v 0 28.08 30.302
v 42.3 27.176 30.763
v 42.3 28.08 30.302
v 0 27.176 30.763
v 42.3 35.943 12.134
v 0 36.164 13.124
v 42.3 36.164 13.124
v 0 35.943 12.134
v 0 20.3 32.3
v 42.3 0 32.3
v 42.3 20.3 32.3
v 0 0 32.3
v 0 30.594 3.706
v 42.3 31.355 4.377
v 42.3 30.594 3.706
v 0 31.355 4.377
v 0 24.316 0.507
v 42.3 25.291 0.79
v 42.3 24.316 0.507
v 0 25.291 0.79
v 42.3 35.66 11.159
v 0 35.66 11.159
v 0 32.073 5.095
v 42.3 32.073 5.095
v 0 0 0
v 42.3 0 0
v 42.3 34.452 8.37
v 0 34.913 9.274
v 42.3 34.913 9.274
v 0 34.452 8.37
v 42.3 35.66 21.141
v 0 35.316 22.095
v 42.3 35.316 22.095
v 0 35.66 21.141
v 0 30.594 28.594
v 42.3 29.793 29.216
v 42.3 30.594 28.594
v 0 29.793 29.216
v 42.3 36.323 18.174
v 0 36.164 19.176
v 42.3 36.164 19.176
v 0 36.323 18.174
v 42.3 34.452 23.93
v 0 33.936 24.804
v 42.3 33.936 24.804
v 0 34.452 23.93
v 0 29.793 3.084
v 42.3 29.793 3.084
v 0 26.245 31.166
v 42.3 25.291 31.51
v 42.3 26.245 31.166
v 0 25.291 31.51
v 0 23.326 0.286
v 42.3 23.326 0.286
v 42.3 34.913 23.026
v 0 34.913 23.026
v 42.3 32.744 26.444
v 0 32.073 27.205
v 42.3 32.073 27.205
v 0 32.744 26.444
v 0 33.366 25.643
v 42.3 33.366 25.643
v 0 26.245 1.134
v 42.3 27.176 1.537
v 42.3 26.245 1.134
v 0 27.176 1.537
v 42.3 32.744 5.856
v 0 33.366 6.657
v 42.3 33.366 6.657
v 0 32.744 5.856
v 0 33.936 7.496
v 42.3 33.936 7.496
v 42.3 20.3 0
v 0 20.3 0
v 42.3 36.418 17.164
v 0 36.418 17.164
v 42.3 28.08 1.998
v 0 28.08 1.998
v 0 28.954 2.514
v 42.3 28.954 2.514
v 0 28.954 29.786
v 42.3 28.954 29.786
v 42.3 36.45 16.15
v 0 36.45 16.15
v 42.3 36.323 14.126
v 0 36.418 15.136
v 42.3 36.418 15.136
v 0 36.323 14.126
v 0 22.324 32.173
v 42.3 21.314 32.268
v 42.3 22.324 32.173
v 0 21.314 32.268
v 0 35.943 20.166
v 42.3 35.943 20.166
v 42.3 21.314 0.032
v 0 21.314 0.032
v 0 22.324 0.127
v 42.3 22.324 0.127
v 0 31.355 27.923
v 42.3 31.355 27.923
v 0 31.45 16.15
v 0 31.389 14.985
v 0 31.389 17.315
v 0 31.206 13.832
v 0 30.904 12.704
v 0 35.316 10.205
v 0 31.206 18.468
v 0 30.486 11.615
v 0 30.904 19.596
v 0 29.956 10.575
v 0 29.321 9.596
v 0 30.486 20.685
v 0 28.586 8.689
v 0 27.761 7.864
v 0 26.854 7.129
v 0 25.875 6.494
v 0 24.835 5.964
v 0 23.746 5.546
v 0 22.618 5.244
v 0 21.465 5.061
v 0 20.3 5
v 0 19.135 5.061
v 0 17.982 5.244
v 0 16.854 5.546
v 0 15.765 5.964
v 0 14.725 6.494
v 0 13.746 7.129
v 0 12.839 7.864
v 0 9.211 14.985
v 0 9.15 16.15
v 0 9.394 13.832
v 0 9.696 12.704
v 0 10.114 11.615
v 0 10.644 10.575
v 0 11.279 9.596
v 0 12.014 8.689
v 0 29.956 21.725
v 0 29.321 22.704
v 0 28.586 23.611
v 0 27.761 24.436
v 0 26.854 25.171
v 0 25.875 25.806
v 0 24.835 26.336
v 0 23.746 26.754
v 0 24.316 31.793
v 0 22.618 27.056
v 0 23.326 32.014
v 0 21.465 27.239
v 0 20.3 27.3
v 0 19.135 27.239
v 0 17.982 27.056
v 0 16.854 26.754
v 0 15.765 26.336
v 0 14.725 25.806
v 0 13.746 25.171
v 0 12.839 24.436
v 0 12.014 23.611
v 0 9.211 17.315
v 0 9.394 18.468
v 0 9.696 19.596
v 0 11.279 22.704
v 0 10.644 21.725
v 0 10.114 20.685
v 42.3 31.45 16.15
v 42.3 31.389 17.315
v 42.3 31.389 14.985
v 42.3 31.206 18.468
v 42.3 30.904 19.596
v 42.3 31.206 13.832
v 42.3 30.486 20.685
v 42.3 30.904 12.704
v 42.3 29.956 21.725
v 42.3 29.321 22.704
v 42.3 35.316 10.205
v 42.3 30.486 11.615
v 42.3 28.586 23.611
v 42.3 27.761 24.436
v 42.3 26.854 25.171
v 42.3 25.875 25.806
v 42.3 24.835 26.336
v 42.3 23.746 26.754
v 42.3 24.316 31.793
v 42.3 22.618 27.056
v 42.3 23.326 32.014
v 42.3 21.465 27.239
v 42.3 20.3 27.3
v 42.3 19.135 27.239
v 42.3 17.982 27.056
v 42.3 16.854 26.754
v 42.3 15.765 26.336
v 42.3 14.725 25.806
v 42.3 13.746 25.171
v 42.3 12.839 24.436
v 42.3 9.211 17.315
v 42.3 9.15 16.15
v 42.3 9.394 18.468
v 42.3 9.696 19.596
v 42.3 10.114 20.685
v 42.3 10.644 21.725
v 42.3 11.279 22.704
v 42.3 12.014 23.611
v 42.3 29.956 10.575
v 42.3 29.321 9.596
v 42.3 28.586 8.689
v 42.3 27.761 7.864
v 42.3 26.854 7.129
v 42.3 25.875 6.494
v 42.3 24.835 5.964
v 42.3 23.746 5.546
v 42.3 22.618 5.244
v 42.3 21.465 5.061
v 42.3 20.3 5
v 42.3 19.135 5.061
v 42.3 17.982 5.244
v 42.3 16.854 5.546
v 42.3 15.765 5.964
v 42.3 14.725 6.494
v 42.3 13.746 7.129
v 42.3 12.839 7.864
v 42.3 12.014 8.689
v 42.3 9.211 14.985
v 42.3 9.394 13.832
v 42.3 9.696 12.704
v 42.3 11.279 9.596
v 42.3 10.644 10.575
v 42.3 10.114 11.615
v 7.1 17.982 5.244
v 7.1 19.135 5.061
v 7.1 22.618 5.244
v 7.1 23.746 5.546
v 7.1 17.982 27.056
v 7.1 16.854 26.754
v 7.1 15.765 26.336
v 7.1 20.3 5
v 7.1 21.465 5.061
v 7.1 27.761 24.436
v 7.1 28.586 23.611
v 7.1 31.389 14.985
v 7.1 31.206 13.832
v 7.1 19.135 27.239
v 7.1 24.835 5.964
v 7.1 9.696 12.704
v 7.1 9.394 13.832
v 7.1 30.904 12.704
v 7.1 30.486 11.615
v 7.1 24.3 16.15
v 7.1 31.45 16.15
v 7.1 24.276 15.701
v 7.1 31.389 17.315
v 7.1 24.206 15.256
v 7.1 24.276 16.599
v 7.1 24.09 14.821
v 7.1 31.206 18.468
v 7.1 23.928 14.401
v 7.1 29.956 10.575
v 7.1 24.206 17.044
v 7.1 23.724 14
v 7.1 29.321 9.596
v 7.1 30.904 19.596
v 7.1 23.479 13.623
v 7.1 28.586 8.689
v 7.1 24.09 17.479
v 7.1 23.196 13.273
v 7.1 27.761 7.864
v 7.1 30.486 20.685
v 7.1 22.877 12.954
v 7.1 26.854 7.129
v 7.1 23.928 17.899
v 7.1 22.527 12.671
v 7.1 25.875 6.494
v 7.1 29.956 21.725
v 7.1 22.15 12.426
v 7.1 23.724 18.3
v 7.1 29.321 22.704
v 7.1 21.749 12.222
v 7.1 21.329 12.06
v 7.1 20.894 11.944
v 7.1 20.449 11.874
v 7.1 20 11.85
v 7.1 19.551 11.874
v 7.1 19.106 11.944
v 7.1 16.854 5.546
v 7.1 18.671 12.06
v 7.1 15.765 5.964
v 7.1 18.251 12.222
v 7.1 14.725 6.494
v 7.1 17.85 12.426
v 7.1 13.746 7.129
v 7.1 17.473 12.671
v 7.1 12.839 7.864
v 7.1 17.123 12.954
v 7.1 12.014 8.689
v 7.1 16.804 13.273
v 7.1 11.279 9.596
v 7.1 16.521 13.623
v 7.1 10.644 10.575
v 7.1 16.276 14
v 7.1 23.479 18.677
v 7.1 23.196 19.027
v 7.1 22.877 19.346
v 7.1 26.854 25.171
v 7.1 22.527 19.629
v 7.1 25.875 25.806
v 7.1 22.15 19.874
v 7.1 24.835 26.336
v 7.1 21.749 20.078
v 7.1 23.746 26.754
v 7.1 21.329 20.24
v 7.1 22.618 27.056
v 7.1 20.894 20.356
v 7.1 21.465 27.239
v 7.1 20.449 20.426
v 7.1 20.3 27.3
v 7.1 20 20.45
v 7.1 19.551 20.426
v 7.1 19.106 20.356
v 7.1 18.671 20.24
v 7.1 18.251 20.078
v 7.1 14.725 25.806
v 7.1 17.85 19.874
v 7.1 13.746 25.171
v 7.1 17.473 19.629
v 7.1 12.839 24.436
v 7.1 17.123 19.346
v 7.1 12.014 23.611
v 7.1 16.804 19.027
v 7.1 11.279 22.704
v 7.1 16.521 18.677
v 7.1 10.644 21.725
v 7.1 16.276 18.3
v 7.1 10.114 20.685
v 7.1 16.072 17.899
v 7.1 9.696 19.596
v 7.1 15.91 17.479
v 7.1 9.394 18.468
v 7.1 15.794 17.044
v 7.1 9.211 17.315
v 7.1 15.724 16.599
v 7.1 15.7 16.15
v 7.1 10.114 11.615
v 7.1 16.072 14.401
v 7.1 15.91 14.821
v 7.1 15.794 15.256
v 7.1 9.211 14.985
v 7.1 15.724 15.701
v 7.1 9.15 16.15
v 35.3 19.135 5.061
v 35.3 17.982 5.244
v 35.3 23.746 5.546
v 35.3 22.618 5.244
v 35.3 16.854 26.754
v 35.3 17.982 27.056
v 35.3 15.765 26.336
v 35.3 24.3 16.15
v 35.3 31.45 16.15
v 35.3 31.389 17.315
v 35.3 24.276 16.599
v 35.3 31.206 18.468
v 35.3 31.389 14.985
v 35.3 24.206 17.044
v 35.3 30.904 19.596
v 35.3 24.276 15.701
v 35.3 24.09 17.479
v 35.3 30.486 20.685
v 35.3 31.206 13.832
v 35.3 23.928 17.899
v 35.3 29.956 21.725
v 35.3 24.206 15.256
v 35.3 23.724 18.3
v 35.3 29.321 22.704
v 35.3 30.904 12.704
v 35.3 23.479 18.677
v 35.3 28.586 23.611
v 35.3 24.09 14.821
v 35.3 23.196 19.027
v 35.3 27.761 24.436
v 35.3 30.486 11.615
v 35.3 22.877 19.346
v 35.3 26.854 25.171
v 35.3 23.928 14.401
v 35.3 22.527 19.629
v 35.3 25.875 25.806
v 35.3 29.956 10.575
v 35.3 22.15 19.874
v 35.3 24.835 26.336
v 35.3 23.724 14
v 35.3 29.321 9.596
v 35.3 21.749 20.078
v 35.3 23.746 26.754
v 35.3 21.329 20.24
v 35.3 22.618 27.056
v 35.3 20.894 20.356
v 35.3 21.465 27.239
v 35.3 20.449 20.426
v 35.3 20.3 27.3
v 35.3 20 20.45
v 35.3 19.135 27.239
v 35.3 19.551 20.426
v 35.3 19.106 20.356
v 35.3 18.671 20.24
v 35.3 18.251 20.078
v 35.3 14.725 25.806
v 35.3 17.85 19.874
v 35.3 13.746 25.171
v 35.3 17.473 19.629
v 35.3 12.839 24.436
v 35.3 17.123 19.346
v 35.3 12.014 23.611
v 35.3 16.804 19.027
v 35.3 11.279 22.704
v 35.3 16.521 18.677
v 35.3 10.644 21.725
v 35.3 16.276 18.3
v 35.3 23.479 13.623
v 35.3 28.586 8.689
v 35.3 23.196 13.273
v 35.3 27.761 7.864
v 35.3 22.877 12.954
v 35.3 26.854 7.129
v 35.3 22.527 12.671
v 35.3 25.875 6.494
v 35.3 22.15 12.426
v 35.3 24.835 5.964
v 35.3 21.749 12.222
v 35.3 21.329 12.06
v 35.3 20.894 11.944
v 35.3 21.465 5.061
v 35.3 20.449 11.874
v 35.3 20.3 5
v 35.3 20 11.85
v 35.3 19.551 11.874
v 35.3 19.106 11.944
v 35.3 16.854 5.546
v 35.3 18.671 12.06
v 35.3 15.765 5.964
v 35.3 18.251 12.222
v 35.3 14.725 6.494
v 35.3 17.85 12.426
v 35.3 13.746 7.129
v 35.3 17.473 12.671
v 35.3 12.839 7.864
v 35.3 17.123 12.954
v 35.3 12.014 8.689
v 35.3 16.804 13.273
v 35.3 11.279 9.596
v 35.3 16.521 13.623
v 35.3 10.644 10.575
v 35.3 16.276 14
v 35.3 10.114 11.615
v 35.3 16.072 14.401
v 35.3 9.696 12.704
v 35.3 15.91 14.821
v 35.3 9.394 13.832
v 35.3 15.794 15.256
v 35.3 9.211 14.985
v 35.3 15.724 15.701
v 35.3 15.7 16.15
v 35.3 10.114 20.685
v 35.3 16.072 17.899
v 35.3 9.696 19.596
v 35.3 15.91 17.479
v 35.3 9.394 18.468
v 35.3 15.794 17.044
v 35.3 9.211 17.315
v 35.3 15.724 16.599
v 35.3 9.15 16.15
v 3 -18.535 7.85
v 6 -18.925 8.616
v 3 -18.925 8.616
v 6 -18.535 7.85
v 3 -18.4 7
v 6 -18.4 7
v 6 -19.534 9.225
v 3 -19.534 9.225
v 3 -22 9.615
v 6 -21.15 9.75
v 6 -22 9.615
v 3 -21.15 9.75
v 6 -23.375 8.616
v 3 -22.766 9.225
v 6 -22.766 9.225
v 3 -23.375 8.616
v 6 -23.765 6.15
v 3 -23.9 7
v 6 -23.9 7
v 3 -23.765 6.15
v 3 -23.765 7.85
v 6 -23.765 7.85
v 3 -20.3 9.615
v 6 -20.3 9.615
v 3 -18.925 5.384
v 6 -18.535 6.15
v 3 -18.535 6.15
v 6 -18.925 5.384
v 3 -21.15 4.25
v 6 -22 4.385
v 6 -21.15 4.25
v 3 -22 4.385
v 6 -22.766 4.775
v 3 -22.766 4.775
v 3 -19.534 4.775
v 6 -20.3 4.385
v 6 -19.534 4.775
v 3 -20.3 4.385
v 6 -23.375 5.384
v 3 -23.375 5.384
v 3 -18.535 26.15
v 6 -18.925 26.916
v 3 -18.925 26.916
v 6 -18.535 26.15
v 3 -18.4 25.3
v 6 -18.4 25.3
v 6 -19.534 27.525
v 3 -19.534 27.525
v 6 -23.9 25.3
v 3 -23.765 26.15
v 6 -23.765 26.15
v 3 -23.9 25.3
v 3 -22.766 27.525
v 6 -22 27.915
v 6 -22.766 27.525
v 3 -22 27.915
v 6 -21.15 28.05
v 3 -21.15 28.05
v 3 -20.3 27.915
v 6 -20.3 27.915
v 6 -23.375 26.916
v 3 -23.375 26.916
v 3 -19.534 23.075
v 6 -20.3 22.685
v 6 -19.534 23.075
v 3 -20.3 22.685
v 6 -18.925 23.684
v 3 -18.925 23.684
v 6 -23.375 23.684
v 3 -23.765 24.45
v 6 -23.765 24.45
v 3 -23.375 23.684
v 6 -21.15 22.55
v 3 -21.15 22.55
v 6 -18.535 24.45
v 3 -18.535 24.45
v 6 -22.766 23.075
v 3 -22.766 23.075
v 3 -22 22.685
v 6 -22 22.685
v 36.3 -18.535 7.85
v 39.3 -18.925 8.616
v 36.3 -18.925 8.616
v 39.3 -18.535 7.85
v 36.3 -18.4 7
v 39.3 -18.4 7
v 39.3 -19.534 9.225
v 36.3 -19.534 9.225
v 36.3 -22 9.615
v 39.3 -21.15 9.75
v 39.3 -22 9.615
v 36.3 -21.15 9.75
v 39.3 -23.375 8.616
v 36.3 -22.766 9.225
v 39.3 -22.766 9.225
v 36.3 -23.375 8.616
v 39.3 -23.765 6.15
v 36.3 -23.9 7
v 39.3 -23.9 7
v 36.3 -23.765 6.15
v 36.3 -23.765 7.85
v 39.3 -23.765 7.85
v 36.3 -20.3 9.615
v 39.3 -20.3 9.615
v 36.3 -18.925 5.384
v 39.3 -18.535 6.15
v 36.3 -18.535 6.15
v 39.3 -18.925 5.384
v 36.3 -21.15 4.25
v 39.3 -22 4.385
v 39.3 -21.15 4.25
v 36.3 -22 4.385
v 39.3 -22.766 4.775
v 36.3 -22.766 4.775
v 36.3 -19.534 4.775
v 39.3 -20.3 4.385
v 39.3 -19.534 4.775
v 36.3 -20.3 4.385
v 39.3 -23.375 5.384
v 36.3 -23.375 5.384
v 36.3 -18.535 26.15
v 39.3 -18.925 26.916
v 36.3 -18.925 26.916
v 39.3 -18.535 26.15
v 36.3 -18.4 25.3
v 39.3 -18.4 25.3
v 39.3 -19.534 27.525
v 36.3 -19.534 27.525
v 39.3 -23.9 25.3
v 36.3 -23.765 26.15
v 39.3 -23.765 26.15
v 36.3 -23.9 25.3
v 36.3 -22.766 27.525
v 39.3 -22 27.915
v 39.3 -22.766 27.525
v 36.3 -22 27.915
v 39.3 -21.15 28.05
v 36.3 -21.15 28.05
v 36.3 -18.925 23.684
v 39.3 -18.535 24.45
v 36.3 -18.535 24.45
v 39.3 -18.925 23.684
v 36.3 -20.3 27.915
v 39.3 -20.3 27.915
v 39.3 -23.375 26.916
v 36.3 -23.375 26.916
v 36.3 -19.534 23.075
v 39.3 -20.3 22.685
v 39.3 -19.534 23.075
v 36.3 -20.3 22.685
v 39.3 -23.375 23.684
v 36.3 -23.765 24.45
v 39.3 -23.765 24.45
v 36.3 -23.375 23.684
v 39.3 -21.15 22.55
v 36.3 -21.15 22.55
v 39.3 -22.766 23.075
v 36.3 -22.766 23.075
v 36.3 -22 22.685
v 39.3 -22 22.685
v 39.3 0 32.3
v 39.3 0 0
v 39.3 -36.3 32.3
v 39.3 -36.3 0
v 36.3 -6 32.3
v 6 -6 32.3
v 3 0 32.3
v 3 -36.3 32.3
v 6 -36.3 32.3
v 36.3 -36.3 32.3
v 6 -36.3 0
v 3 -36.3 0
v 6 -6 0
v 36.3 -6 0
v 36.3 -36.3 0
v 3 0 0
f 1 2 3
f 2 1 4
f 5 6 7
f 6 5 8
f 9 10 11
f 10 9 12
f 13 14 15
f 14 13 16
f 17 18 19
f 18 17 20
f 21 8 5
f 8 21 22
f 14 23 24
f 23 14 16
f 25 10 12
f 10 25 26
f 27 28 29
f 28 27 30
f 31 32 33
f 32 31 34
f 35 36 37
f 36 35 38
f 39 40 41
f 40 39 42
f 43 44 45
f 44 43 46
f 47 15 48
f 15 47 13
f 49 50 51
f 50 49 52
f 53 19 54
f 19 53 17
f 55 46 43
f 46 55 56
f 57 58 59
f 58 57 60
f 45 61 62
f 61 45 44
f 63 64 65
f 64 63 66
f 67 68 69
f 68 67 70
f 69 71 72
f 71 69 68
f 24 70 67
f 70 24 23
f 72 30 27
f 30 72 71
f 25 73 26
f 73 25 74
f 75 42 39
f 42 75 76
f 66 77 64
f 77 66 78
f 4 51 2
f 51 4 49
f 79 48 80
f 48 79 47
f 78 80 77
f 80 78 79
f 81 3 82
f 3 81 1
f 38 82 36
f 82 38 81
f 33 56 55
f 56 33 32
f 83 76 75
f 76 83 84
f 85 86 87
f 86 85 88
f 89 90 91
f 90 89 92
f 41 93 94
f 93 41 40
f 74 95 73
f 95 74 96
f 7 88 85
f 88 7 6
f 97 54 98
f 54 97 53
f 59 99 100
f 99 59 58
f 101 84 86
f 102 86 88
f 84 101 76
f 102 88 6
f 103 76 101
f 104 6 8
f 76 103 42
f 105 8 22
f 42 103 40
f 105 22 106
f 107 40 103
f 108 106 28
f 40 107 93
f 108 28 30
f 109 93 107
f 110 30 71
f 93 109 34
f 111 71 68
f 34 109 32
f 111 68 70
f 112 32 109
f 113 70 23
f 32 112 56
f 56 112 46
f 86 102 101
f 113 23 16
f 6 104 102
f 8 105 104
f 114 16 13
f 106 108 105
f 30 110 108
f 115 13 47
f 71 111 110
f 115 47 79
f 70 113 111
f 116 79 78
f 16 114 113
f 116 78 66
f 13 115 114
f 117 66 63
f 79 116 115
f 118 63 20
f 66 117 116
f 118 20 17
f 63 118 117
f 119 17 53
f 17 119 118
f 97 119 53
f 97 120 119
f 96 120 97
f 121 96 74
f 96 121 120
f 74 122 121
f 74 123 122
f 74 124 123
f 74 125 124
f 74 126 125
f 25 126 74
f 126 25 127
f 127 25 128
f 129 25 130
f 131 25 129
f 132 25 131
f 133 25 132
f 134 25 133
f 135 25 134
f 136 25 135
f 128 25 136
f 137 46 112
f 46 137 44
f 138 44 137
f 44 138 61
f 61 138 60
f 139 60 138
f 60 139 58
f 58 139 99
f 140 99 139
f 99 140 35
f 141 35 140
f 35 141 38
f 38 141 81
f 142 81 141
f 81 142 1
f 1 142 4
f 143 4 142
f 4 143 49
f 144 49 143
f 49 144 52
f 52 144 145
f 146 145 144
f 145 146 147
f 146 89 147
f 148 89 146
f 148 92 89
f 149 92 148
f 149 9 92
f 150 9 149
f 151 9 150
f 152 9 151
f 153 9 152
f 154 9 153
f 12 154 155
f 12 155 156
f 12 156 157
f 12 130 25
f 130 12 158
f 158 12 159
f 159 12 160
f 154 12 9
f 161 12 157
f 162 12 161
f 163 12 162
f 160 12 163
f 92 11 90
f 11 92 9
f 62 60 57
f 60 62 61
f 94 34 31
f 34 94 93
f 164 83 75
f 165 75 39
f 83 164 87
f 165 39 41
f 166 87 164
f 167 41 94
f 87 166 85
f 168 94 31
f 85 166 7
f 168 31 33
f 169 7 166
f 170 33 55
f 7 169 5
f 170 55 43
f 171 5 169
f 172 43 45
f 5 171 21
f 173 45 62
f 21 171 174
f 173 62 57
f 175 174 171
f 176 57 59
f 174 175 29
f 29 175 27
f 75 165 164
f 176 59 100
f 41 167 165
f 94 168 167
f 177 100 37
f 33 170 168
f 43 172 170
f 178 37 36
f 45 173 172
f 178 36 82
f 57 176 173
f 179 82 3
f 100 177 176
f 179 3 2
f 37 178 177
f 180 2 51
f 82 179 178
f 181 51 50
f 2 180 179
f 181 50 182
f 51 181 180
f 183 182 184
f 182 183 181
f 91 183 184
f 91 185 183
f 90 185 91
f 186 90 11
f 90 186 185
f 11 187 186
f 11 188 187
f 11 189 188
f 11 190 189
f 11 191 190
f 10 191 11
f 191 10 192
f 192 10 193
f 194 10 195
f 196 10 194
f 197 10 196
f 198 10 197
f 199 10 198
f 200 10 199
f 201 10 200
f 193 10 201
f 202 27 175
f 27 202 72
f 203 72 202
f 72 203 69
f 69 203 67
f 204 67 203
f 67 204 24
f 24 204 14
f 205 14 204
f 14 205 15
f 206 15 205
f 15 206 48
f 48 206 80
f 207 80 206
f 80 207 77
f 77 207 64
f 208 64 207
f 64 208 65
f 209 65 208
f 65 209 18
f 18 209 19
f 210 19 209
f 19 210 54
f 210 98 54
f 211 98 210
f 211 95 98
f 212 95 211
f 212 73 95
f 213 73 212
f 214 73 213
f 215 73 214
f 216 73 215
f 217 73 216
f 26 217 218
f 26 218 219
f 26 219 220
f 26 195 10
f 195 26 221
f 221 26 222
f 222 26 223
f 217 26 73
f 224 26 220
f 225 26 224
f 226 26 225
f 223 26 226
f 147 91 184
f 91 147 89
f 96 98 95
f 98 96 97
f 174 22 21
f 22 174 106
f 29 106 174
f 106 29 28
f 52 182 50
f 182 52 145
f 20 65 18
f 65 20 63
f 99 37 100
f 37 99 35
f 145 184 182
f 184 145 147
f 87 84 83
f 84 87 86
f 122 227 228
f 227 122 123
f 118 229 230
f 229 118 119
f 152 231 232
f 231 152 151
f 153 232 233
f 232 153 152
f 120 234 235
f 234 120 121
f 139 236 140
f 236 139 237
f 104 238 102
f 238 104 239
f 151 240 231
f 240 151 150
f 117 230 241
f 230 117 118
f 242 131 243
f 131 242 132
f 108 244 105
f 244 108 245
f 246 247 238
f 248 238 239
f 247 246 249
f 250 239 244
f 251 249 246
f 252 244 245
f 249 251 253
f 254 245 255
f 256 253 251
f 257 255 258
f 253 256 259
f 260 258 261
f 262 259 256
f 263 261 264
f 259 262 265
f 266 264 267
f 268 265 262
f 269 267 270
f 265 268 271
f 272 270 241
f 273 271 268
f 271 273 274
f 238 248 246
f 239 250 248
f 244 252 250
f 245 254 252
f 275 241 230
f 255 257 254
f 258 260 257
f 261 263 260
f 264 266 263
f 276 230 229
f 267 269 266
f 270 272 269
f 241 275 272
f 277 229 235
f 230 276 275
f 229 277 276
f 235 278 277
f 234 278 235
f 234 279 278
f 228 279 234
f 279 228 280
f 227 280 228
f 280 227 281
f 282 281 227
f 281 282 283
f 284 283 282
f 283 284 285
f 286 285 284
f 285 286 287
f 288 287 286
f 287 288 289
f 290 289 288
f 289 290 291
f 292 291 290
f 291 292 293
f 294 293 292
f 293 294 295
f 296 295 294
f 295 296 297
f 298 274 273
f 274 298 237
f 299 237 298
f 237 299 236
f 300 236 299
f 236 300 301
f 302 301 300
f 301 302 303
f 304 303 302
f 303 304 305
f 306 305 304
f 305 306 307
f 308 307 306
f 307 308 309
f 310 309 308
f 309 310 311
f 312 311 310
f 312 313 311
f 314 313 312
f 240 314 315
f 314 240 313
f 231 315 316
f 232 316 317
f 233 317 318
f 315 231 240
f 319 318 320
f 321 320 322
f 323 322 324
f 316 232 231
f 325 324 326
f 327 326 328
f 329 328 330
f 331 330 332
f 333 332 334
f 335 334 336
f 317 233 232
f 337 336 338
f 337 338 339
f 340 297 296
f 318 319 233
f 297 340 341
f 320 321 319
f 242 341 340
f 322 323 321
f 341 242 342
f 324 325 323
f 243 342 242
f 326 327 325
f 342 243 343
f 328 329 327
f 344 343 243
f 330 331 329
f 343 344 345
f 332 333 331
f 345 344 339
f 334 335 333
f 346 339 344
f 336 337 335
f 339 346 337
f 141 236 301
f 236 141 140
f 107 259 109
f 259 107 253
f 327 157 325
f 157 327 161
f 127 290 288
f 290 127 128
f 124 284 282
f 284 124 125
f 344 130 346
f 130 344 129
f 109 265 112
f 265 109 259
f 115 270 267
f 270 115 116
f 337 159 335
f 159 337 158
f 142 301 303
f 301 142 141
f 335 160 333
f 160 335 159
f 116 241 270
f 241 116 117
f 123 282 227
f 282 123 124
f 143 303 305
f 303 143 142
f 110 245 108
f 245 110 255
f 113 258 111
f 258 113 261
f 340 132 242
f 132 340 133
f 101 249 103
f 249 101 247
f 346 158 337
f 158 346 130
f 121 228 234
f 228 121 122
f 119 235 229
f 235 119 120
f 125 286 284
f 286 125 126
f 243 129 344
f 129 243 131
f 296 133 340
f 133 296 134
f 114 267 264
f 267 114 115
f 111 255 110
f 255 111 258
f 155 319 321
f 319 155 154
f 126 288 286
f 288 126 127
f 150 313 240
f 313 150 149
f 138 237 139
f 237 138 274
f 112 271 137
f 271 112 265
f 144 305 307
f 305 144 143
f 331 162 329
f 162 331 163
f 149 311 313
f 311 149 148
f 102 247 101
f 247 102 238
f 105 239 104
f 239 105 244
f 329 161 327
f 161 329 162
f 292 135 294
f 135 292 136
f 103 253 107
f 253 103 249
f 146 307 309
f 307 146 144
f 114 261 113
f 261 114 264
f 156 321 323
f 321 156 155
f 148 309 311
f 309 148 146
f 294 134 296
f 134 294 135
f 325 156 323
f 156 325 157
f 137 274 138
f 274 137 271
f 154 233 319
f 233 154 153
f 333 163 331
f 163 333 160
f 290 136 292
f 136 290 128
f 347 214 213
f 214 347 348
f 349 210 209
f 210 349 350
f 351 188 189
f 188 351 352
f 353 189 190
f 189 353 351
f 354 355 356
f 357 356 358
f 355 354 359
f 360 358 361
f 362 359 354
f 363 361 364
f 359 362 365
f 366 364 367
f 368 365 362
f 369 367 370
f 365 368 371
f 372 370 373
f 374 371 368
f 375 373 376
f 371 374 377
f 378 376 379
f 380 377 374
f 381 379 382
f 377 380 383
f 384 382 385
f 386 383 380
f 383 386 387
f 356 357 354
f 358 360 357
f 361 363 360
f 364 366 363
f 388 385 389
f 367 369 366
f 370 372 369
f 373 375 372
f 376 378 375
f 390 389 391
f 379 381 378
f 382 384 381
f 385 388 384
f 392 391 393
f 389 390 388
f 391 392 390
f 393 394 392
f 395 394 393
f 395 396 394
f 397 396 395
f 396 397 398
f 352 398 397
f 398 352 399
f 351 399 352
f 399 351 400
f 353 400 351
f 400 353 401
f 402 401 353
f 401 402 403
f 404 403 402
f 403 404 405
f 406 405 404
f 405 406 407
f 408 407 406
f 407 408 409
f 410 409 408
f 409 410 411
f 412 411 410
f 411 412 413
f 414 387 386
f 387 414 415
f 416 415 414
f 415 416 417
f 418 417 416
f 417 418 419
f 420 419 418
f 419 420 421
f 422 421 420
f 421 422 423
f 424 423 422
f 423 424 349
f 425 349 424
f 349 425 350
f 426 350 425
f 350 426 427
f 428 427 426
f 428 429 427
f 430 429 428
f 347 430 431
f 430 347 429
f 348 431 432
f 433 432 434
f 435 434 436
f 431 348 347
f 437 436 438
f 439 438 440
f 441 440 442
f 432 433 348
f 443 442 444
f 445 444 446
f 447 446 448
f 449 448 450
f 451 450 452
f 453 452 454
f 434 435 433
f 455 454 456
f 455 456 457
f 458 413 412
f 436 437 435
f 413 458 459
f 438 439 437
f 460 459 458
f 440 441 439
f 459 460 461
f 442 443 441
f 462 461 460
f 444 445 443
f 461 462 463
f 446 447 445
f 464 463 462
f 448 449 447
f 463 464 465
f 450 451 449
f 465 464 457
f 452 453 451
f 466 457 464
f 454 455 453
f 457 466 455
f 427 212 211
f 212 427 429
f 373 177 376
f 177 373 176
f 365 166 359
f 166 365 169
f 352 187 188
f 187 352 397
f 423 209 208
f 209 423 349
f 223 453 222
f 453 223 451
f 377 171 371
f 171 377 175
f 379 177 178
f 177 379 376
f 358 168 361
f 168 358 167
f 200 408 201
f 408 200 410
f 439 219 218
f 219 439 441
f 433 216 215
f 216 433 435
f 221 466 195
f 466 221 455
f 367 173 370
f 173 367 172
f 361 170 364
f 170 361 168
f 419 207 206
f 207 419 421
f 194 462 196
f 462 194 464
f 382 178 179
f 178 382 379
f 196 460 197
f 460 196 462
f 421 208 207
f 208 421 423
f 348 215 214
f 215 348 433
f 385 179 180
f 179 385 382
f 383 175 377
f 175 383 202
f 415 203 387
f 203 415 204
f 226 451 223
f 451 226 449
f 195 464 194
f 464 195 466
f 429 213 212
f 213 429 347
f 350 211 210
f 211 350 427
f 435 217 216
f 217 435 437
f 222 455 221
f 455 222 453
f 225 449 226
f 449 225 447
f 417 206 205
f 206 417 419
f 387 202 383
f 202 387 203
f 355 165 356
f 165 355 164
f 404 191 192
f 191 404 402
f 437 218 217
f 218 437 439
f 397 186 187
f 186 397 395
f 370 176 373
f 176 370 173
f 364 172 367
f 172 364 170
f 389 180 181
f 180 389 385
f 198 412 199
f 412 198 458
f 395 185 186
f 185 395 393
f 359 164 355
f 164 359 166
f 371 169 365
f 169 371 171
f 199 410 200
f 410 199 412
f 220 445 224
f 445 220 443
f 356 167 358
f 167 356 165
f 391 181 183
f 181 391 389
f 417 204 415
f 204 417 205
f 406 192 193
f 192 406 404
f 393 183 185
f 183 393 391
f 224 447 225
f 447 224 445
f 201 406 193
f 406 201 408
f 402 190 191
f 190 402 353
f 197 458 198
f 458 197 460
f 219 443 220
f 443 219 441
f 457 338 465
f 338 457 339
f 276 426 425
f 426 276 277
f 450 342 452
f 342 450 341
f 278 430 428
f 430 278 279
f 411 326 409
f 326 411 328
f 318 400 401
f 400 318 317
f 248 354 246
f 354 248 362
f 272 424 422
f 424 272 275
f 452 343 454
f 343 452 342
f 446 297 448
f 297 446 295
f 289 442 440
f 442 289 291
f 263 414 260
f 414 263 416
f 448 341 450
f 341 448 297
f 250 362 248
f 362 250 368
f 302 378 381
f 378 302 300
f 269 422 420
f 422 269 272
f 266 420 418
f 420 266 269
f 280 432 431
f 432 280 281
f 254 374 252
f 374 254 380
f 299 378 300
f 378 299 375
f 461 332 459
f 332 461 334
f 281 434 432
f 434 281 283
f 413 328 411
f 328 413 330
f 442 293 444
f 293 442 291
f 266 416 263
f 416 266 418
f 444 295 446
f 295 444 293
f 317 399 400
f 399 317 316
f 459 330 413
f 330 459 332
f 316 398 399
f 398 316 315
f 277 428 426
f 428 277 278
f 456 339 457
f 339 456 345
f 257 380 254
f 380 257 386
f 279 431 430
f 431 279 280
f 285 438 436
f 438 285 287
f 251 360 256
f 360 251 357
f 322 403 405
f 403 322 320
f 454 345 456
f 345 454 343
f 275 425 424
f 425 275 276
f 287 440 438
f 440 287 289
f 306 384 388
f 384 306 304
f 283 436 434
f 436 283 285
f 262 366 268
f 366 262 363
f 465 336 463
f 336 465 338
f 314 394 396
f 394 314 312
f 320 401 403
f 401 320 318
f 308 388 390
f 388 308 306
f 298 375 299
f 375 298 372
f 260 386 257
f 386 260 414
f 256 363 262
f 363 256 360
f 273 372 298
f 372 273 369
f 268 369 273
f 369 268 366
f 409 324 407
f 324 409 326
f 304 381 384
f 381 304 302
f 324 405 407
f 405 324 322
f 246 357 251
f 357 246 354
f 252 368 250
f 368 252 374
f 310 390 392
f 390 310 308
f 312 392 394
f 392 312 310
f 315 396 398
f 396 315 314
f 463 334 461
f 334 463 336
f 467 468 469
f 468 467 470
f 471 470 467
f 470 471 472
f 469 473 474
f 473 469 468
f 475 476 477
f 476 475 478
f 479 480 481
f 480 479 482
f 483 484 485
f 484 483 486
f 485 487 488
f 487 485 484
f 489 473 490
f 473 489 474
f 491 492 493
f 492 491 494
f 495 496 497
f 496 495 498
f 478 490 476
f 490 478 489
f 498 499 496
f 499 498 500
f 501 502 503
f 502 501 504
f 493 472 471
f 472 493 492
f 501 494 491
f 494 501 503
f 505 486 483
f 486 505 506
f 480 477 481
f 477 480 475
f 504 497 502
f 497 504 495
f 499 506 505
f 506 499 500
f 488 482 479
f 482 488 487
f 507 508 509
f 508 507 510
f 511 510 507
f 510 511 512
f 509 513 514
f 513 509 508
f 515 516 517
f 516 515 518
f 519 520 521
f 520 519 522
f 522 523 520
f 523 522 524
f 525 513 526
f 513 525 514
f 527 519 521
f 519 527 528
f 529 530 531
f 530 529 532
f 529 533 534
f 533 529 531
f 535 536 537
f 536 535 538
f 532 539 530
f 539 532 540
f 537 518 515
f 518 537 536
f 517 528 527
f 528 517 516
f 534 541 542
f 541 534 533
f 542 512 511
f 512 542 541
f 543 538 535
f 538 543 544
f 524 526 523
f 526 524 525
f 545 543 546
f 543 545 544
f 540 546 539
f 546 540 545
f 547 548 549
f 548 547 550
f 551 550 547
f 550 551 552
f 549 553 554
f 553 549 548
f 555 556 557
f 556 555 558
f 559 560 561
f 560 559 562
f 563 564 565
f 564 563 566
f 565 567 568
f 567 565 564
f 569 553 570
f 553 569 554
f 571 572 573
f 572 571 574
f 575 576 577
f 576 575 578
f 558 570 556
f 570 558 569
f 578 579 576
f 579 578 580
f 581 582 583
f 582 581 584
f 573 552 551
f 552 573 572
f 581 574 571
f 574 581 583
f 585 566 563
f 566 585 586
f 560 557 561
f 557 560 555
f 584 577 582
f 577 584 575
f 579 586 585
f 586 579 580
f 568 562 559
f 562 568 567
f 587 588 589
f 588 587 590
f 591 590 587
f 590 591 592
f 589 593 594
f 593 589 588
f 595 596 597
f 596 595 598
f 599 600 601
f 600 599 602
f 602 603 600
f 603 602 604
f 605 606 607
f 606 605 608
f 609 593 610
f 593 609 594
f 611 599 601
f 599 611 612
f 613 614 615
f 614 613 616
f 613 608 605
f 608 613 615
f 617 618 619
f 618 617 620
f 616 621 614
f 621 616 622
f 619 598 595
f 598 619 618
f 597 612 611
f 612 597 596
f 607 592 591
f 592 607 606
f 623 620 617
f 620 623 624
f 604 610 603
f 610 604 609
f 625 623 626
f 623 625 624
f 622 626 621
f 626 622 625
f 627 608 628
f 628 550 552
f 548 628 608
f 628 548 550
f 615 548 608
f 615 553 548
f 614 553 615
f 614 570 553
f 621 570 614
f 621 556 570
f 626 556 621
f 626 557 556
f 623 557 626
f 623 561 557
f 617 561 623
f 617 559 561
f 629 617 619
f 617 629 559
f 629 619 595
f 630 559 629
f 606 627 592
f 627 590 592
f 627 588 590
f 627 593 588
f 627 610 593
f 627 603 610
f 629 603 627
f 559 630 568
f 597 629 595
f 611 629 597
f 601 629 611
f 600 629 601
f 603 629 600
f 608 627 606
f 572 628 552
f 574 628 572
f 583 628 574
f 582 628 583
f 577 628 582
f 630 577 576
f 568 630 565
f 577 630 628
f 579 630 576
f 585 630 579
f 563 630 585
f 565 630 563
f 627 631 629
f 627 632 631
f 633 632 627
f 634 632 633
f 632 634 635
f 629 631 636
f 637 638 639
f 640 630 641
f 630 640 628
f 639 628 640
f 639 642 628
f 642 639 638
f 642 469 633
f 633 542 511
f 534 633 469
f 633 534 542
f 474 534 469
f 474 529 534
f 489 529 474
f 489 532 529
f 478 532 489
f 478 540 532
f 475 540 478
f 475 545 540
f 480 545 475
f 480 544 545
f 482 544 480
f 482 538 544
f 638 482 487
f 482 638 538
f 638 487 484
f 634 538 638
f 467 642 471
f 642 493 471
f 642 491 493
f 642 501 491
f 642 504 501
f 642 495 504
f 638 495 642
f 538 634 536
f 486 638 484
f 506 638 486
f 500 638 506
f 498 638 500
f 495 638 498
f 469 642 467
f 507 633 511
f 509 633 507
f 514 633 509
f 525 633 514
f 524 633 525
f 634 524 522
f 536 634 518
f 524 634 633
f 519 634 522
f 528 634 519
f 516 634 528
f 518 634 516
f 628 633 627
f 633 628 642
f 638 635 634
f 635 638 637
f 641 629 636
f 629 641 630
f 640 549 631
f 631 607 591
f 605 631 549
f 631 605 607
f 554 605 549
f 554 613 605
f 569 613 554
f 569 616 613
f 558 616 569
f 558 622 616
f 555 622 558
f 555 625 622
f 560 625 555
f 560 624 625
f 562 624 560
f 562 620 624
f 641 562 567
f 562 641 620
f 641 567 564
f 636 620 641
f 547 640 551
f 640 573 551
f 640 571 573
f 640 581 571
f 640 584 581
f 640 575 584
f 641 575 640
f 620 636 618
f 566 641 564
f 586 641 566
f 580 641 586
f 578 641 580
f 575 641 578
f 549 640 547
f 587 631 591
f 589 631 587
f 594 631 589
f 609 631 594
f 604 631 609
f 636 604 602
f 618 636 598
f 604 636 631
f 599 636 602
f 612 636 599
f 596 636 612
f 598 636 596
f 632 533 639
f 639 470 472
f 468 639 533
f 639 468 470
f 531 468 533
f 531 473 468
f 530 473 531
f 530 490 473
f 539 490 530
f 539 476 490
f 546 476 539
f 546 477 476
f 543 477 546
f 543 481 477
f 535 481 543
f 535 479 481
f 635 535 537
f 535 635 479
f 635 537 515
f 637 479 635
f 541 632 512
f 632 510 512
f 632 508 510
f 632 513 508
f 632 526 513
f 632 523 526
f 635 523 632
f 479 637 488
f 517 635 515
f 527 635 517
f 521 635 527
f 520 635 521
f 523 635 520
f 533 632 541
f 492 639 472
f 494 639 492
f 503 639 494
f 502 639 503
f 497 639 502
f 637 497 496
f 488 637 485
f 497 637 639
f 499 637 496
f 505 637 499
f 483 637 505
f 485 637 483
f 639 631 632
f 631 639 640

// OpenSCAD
// file: ../lib/ALU_profile_holder_side.scad
include <../../parameters.scad>

module ALU_profile_holder_side(height) {
    wall_thickness = ALU_profile_holder_wall_thickness;
    
    //díry na přišroubování k Al profilům
    module screws_holes(diameter) {
        translate([0, 0, 7])
            rotate([90, 0, 90])
                cylinder(d=diameter, h=wall_thickness*2, center=true, $fn=20);
        
        translate([0, 0, height-7])
            rotate([90, 0, 90])
                cylinder(d=diameter, h=wall_thickness*2, center=true, $fn=20);
    }
    
    difference() {
        cube([ALU_profile_width+wall_thickness*2, ALU_profile_width + wall_thickness*2, height]);

        translate([wall_thickness, -0.1, -0.1])
            cube([ALU_profile_width, ALU_profile_width + 0.1, height + 0.2]);
        
        translate([wall_thickness*0.5, ALU_profile_width/2, 0]) {
            screws_holes(M5_screw_diameter);
            translate([ALU_profile_width+wall_thickness, 0, 0]) {
                screws_holes(M5_screw_diameter);
            }
        }
    }
}

ALU_profile_holder_side(30);
// file: ../lib/ALU_joint_A.scad
include <../../parameters.scad>

module ALU_joint_A(width) {
    difference() {
        hull() {
            cube([width, 10, 608_bearing_outer_diameter+10]);
            translate([0, 608_bearing_outer_diameter-2, (608_bearing_outer_diameter+10)/2])
                rotate([0, 90, 0])
                    cylinder(d=608_bearing_outer_diameter+10, h=width, $fn=100);
        }
        
        translate([-0.1, 608_bearing_outer_diameter-2, (608_bearing_outer_diameter+10)/2])
                rotate([0, 90, 0])
                    cylinder(d=608_bearing_outer_diameter, h=608_bearing_thickness+0.1, $fn=60);

        translate([width-608_bearing_thickness+0.1, 608_bearing_outer_diameter-2, (608_bearing_outer_diameter+10)/2])
                rotate([0, 90, 0])
                    cylinder(d=608_bearing_outer_diameter, h=608_bearing_thickness+0.1, $fn=60);
        
        translate([0, 20, (608_bearing_outer_diameter+10)/2])
                rotate([0, 90, 0])
                    cylinder(d=M8_screw_diameter, h=width, $fn=60);
    }
}

ALU_joint_A(20);
// file: ../../parameters.scad
maximum_printable_size = 150;

layer_thickness = 0.3;
global_clearance = 0.5;

platform_base_diameter = 400; // Průměr ukotvení válců spodní platformy
platform_base_thickness = 20;
platform_cylinder_medium_length = 250;  // délka pneumatického válce s pístem vysunutým do poloviny rozsahu
platform_base_cylinder_spacing = 38;    //rozestupy spodního a horního ukotvení válců.
platform_top_cylinder_spacing = 30;
platform_top_diameter = 150;   // Průměr horní základny (vdálenost od středu základny do středu kulového kloubu ke kterému je uchycen pneumatický válec)


// screw length step - minimum difference in length between two types of screws
basic_screw_length = 5;


//Screw diameter and nut for M10 [mm]
M10_screw_diameter = 10.4;
M10_head_height = 10;
M10_head_diameter = 16+0.5;
M10_nut_height = 10.5;
M10_nut_diameter = 25.5;
M10_nut_pocket = 22.3;

//Screw diameter for M8 [mm]
M8_screw_diameter = 8.6;
M8_head_height = 8;
M8_head_diameter = 13.5;
M8_nut_height = 7.5;
M8_nut_diameter = 14.4 + 0.5;
M8_nut_pocket = 13 + 0.5;
M8_washer_diameter = 16;
M8_washer_thickness = 1.5;


//Screw diameter and nut for M6 [mm]
M6_screw_diameter=6.5;
M6_head_diameter = 10+0.5;
M6_head_height = 6;
M6_nut_height = 4.9;
M6_nut_diameter = 11.8;
M6_nut_pocket = 10.4;
M6_square_nut_height = 3;
M6_square_nut_diameter = 10;

//Screw diameter and nut for M5 [mm]
M5_screw_diameter=5.5;
M5_head_height = 5;
M5_head_diameter = 13+0.5;
M5_nut_height = 4.5;
M5_nut_diameter = 9.4;
M5_nut_pocket = 8.4;

//Screw diameter and nut for M4 [mm]
M4_screw_diameter=4.5;
M4_screw_head_height = 4;
M4_nut_height = 3.2;
M4_nut_diameter = 8.4;
M4_nut_pocket = 7.5;

//Screw diameter and nut for M3 [mm]
M3_screw_diameter = 3.2;
M3_nut_height = 2.7;
M3_nut_diameter = 6.6;
M3_screw_head_height = 3;

//Screw diameter and nut for M2,5 [mm]
M2_5_screw_diameter = 2.7;
M2_5_nut_height = 2.3;
M2_5_nut_diameter = 6;
M2_5_nut_pocket = 5.5;

// kulove lozisko

bearing_efsm_08_h = 33+1;
bearing_efsm_08_m = 22;
bearing_efsm_08_db = 18;
bearing_efsm_08_ag = 10.5;
bearing_efsm_08_n = M4_screw_diameter;
bearing_efsm_08_a1 = 5.5;
bearing_efsm_08_d = 8.25;
bearing_efsm_08_B = 8; // ball height

bearing_efsm_10_h = 38+1;
bearing_efsm_10_m = 26;
bearing_efsm_10_db = 21.9;
bearing_efsm_10_ag = 12+0.2;
bearing_efsm_10_n = M5_screw_diameter;
bearing_efsm_10_a1 = 6.5;
bearing_efsm_10_d = 10.25;


bearing_efsm_12_width = 40+1;
bearing_efsm_12_h = bearing_efsm_12_width;
bearing_efsm_12_boltd = 28/2; // polovina vzdalenosti mezi srouby
bearing_efsm_12_m = bearing_efsm_12_boltd*2;
bearing_efsm_12_db = 25;
bearing_efsm_12_ag = 13;
bearing_efsm_12_a1 = 7;
bearing_efsm_12_n = M5_screw_diameter;
bearing_efsm_12_d = 12.15;
bearing_efsm_12_B = 10; // ball height
bearing_efsm_space = 1;

bearing_efsm_17_width = 54+1;
bearing_efsm_17_h = bearing_efsm_17_width;
bearing_efsm_17_boltd = 38/2; // polovina vzdalenosti mezi srouby
bearing_efsm_17_m = bearing_efsm_17_boltd*2;
bearing_efsm_17_db = 35;
bearing_efsm_17_ag = 18;
bearing_efsm_17_n = M6_screw_diameter;
bearing_efsm_17_a1 = 10;
bearing_efsm_17_B = 17; // ball height

//limcove lozisko
bearing_EFOM_10_L=26; //celkova sirka zakladny
bearing_EFOM_10_d1=10.3;//diametr otvoru real=10 mm
bearing_EFOM_10_dB=22;//diametr vystupku pro ulozeni lozika
bearing_EFOM_10_H=52;//celková delka zakladny
bearing_EFOM_10_J=36;// hole pitch
bearing_EFOM_10_A1=6.5;//vyska pouzdra
bearing_EFOM_10_Ag=12;//celkova vyska
bearing_EFOM_10_N1=5;//sirka otvoru pro sroub
bearing_EFOM_10_N2=8;//delka otvoru pro sroub
bearing_EFOM_10_m=36;//roztec der pro sroub
bearing_EFOM_10_h=9;//vyska lozika


608_bearing_outer_diameter = 22.3;
608_bearing_inner_diameter = 16;
608_bearing_thickness = 7.1;


// 20 KG servo parameters

servo_20kg_axis_offset = 9.375; // jak je osa mimo stredu
servo_20kg_body_x = 42;
servo_20kg_body_y = 21;
servo_20kg_body_z = 40;
servo_20kg_thread_x = 49/2;
servo_20kg_thread_y = 10/2;
servo_20kg_body_below = 10; // jak hluboko je tělo serva pod drzaky na srouby
servo_20kg_below = 25.8; // jak hluboko je páka serva pod drzaky na srouby

servo_20kg_bolt_d = 2.5+0.3;
servo_20kg_nut_d = 5+0.3;


//strain gauge
strain_gauge_width = 12.7;
strain_gauge_length = 75.1;
strain_gauge_screw_distance = 10;

//ALU profile
ALU_profile_width = 30.3;
ALU_profile_holder_wall_thickness = 3;
ALU_profile_groove_width = 8;

//pillow block bearing
//https://www.igus.eu/product/372
//Part no. KSTM-08
KSTM08_screws_distance = 33;         //m
KSTM08_screws_holes_diameter = 4.5;  //d2
KSTM08_flange_thickness = 6;         //h3
KSTM08_case_width = 9;               //C1
KSTM08_case_length = 47;             //a
KSTM08_ball_width = 12;              //B


//ložiska pro malý rotor
bearing_outer_diameter = 10.2;    // Rozměr B1 v nákresu s přídavkem na toleranci otvoru
bearing_thickness = 4;        // Rozměr B2 v nákresu
//bearing_shaft_length = 19.5;    // Rozměr B3 v nákresu, Originalni hodnota 19.5
bearing_shaft_length = 20;    // Rozměr B3 v nákresu


//parametry víčka s telemetrickou anténou
S01_sila_materialu=1.2;
S01_vyska_horni_zavit=10;
S01_hloubka_zavitu=4;
S01_prumer_vnitrni=50;
LO_spodni_prumer=17.2;
LO_vyska_bez_krytu=15;
S01_tolerance_zavit=1.5;
R01_vyska_prekryti_statoru=10;
// main file
include <../../parameters.scad>
use <../lib/ALU_joint_A.scad>
use <../lib/ALU_profile_holder_side.scad>


module 888_5010() {
    screw_head_height = 3;

    ALU_joint_A(ALU_profile_width+ALU_profile_holder_wall_thickness*2+screw_head_height*2);
    translate([screw_head_height, -ALU_profile_width-ALU_profile_holder_wall_thickness*2, 0])
        ALU_profile_holder_side(608_bearing_outer_diameter+10);


}

888_5010();
